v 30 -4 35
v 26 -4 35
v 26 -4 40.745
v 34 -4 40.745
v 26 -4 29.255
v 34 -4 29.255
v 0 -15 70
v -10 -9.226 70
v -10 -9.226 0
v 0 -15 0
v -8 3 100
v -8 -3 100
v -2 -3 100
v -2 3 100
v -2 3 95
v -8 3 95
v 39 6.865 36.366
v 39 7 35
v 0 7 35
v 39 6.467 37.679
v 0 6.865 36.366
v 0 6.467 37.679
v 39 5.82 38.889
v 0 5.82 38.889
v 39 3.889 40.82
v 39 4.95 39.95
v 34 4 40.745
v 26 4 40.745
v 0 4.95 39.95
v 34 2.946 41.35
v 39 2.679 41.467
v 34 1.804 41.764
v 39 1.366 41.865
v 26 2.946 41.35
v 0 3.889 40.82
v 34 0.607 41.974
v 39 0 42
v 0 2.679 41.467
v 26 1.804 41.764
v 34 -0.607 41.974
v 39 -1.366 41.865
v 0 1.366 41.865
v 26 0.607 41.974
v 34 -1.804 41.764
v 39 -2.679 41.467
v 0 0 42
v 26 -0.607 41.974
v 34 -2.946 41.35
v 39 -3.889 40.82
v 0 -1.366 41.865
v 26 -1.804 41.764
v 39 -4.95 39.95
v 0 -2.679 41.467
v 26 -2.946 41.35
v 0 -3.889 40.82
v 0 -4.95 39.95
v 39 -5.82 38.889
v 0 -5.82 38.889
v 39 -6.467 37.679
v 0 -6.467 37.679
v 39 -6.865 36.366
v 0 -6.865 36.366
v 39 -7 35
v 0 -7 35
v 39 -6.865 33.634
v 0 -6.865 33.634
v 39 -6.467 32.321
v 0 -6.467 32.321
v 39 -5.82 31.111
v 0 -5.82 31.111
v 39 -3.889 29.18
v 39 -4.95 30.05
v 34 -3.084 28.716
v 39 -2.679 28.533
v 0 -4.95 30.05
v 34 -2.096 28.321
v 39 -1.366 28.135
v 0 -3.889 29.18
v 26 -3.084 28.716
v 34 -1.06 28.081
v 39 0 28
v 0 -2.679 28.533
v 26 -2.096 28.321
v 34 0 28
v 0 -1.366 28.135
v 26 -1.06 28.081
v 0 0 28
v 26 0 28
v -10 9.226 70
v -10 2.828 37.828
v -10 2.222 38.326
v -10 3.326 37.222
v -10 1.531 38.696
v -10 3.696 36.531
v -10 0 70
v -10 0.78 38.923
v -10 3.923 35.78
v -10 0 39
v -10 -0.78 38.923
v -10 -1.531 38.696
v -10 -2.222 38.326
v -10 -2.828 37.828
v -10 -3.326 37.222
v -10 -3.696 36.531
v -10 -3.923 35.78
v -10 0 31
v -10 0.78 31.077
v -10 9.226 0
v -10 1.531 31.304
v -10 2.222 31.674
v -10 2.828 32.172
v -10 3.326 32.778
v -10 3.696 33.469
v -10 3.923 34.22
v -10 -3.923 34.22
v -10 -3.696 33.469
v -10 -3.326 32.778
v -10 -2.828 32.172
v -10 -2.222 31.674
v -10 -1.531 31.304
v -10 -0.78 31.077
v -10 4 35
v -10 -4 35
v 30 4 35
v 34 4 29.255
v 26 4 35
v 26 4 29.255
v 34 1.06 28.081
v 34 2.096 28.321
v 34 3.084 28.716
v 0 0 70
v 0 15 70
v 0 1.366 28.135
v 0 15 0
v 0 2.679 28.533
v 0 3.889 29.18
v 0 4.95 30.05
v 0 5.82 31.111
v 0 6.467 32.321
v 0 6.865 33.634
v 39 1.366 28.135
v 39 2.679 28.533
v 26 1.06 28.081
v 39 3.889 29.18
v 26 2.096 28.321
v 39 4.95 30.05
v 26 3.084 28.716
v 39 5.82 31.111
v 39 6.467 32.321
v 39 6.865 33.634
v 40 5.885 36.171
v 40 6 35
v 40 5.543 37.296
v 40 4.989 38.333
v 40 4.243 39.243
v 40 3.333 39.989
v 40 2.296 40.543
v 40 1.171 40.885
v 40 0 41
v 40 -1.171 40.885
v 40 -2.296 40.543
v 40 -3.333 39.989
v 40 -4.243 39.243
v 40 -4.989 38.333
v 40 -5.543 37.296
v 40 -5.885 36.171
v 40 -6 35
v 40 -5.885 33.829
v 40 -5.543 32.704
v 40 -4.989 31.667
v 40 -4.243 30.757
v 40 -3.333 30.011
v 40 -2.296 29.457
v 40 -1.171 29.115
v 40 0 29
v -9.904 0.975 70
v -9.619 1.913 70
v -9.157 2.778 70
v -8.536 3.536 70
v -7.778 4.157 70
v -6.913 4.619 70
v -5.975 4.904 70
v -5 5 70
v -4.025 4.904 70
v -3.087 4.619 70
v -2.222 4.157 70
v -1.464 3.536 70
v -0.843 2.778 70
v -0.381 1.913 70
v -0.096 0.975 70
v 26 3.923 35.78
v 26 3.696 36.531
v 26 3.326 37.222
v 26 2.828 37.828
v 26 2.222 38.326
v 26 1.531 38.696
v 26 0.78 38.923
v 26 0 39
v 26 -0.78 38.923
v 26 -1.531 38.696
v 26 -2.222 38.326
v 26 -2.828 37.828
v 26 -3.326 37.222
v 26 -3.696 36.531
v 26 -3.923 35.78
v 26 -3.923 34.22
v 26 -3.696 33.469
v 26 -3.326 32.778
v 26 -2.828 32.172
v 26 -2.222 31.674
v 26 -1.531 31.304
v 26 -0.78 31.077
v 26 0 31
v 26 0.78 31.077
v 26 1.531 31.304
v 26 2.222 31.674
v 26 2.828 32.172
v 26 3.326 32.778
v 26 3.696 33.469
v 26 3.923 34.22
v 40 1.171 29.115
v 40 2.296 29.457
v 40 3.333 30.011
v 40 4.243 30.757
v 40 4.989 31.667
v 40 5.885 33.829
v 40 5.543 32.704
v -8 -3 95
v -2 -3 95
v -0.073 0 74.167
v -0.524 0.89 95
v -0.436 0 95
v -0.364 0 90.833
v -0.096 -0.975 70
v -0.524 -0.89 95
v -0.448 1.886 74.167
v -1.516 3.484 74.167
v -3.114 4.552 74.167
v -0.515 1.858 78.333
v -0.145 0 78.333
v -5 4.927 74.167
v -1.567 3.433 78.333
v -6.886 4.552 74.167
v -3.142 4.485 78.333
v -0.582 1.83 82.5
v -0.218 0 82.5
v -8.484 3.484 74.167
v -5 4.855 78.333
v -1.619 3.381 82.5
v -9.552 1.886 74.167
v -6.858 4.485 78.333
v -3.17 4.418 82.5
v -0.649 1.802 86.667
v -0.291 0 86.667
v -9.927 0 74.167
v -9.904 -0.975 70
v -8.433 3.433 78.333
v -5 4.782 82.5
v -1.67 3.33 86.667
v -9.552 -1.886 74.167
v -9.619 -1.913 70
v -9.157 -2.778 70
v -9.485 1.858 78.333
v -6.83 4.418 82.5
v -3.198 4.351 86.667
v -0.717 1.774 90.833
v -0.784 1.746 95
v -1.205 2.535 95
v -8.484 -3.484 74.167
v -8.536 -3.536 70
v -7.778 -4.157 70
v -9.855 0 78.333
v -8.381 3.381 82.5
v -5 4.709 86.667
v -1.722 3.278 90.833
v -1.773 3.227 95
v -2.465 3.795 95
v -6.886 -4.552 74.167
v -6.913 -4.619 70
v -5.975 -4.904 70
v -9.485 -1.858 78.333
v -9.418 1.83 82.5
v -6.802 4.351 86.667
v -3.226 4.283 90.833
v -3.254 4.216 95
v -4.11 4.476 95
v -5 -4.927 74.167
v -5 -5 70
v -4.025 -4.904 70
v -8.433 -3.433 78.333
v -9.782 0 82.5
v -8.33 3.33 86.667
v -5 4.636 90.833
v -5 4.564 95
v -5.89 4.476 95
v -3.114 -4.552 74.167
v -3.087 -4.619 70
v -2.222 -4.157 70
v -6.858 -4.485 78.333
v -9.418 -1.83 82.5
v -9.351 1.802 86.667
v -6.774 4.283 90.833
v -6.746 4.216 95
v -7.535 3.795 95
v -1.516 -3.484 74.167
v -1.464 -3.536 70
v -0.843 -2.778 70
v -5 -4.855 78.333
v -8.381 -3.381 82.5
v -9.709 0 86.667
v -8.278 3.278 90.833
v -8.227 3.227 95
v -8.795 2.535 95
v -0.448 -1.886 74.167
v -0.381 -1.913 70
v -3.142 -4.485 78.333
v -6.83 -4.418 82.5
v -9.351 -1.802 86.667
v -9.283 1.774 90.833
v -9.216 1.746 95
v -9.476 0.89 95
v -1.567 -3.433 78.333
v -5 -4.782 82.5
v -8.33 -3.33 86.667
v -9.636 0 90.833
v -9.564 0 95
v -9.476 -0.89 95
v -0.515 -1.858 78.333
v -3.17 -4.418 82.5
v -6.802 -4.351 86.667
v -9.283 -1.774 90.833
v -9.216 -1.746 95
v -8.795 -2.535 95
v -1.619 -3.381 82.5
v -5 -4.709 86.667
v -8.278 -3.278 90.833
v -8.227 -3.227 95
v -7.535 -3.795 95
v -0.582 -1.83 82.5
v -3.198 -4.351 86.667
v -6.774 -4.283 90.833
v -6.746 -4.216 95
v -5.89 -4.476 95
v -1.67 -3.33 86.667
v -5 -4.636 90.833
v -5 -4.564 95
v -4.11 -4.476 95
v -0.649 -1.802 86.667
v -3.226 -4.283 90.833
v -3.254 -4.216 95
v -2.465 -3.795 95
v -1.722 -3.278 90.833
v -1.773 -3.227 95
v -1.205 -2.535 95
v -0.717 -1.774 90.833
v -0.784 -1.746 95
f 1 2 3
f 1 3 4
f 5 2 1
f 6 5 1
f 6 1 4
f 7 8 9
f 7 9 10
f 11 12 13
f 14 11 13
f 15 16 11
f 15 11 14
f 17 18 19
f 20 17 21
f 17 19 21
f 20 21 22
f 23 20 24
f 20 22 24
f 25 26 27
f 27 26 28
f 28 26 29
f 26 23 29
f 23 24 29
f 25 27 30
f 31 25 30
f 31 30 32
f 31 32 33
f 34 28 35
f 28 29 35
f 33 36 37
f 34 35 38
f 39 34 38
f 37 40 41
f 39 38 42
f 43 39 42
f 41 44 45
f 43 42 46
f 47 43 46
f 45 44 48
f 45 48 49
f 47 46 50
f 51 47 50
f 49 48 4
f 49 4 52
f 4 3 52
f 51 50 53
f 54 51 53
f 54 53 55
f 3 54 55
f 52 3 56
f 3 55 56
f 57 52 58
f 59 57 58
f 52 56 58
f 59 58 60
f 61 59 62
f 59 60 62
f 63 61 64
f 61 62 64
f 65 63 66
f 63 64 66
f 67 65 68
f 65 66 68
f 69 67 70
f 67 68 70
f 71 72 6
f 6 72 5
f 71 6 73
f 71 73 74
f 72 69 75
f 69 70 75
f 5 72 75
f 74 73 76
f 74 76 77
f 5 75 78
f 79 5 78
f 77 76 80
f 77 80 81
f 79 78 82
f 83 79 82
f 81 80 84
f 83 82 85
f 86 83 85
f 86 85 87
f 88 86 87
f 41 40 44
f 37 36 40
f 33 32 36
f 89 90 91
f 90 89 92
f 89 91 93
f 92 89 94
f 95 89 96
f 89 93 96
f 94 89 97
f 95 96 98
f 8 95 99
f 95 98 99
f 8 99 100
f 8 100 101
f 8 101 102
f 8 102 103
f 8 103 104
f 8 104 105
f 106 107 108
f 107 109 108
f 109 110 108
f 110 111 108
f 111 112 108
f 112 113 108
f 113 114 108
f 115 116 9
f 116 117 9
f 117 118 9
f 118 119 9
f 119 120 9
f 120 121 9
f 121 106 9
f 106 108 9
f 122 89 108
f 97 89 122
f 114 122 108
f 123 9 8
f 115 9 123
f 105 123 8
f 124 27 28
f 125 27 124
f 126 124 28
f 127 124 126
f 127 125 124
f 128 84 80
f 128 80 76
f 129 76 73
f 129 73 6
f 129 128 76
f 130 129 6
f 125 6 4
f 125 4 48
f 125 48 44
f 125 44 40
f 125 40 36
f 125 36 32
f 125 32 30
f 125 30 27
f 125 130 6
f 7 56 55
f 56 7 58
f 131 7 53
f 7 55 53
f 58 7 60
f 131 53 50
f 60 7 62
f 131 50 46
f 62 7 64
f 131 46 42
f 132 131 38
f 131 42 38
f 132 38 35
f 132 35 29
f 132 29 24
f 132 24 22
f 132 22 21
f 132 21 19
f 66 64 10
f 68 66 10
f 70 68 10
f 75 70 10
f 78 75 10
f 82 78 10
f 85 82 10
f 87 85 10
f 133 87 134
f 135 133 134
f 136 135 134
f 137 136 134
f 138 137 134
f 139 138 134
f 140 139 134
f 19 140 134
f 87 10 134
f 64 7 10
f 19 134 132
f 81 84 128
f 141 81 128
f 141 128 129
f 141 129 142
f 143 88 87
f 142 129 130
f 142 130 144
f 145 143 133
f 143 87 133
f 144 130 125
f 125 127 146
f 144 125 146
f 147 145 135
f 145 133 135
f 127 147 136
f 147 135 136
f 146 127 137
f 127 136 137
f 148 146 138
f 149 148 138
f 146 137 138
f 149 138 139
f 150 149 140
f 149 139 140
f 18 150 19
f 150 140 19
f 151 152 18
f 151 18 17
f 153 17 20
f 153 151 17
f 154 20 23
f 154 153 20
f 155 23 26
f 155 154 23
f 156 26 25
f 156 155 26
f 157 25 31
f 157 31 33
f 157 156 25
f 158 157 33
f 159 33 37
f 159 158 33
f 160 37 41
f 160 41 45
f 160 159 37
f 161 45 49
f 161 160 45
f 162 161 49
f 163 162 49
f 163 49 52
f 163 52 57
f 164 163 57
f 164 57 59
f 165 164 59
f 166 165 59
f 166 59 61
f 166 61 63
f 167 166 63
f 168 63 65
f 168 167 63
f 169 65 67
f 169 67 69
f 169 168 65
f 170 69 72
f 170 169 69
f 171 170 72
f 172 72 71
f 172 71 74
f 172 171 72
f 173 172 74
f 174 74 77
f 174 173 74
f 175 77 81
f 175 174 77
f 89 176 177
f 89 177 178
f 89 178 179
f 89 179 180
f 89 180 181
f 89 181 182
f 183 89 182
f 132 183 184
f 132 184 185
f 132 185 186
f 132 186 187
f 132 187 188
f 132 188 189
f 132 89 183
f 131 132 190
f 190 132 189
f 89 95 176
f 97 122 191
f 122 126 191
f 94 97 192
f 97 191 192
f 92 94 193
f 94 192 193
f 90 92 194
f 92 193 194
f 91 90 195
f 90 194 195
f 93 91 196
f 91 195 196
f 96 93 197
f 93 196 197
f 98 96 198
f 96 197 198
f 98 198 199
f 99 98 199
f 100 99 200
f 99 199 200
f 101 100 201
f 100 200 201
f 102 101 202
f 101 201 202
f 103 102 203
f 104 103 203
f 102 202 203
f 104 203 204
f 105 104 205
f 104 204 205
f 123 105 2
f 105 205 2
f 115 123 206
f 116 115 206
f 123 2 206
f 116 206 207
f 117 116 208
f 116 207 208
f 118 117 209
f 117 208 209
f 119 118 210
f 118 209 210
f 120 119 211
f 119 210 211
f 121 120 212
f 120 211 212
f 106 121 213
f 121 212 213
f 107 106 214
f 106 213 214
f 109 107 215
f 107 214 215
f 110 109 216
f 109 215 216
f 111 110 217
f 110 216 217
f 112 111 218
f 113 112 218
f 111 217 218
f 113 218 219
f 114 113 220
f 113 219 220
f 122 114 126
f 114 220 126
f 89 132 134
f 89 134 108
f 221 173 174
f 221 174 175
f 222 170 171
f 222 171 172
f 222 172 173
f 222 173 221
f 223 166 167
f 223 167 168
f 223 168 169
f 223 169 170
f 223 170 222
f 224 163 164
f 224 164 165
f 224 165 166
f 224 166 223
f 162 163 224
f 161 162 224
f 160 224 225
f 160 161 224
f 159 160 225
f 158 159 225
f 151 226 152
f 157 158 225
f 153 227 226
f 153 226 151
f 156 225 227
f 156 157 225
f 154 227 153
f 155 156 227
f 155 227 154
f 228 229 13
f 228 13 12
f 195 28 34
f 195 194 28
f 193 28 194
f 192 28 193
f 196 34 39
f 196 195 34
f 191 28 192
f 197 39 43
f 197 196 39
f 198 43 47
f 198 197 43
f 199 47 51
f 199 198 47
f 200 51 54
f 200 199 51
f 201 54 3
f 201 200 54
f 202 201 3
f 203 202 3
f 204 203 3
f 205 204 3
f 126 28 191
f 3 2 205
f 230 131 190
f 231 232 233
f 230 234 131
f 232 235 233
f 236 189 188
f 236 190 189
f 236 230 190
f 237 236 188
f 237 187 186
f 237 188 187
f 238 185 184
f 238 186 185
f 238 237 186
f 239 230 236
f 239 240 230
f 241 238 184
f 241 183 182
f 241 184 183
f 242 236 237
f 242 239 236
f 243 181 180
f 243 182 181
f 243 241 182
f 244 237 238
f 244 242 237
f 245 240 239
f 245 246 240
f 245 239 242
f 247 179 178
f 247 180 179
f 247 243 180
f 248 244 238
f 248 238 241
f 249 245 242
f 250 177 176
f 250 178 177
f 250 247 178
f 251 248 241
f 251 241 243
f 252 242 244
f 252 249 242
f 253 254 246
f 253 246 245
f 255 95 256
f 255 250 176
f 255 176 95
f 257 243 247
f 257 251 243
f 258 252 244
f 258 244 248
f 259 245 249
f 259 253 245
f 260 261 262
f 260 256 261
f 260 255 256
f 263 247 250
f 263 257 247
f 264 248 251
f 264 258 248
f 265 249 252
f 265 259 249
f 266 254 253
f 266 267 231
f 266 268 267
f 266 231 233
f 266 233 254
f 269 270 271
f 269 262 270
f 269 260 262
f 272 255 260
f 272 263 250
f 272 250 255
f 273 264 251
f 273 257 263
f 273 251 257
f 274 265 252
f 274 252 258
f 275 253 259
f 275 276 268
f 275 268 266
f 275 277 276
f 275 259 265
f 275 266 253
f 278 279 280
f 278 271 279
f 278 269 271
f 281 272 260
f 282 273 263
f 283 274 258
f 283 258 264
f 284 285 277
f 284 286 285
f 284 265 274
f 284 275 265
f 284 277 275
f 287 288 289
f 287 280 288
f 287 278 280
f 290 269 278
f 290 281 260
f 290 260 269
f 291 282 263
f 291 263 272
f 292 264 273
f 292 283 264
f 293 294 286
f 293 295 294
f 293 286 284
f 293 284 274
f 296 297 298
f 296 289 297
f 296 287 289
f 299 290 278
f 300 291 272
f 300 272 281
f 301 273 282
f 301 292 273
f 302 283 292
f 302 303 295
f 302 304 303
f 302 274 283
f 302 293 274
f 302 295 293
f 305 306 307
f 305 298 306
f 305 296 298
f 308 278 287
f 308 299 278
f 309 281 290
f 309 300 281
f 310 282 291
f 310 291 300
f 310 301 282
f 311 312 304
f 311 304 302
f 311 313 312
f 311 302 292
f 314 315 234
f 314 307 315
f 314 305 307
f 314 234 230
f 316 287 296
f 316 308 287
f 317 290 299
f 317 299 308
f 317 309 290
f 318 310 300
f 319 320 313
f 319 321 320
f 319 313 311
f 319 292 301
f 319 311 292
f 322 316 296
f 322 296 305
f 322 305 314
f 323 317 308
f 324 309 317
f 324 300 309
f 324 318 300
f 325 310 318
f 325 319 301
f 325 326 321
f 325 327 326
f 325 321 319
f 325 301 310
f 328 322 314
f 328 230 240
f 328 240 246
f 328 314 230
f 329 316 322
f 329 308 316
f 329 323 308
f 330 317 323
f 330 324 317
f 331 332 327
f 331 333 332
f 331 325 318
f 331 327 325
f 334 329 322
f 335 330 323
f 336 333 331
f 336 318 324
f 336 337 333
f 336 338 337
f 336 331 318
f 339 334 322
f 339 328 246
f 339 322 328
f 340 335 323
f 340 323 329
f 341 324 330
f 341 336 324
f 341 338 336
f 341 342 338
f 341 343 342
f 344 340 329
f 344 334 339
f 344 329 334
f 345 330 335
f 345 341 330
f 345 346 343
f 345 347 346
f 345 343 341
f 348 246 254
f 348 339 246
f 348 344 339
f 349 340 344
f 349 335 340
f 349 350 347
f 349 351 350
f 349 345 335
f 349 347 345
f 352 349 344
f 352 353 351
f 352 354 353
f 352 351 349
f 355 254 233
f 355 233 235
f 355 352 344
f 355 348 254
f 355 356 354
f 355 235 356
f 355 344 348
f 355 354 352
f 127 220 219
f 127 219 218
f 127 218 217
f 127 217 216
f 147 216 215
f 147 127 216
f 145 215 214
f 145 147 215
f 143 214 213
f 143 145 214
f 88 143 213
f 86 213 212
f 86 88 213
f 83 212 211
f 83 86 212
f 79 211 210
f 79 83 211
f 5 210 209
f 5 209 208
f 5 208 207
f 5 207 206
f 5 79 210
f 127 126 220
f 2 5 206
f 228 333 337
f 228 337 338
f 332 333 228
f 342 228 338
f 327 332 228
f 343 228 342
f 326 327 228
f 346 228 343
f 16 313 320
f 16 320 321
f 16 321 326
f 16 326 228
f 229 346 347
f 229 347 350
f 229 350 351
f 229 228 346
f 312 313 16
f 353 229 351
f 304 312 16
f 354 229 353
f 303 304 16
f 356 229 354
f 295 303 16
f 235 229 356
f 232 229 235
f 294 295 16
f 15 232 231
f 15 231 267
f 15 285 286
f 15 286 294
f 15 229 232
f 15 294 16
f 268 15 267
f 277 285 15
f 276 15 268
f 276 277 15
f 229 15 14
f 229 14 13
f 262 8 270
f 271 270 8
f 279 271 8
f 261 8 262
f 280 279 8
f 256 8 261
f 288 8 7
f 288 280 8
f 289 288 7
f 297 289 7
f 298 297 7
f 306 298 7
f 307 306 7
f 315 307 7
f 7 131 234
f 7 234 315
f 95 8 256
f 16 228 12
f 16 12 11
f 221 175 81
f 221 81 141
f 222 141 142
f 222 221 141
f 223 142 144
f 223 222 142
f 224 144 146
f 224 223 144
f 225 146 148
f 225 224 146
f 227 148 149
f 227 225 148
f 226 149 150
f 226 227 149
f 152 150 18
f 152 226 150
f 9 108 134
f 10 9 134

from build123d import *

# Parameters (mm, degrees)
F1_DEPTH      = 70
F3_DEPTH      = 40
F4_SIZE       = 1
F6_DEPTH      = 25
F6_DEPTH_BACK = 100
F7_R          = 4
F8_DEPTH      = 30
F8_DEPTH_BACK = 25
F10_R         = 5
F11_DEPTH     = 30
F11_TAPER     = 1
F13_START     = 25
F12_R         = 21.0146982342
F13_DEPTH     = 15


with BuildPart() as f1:
    # F0 (on Top) → F1 (new body)
    with BuildSketch(Plane.XY):
        Polygon((0, -15), (0, 0), (0, 15), (-10, 9.2264973081), (-10, -9.2264973081), align=None)
    extrude(amount=F1_DEPTH)

    # F2 (on Right) → F3 (join)
    with BuildSketch(Plane.YZ):
        with BuildLine():
            ThreePointArc((7, 35), (-4.9497474683, 39.9497474683), (0, 28))
            ThreePointArc((0, 28), (4.9497474683, 30.0502525317), (7, 35))
        make_face()
        with BuildLine():
            ThreePointArc((4, 35), (2.8284271247, 32.1715728753), (0, 31))
            ThreePointArc((0, 31), (-2.8284271247, 37.8284271247), (4, 35))
        make_face(mode=Mode.SUBTRACT)
        with BuildLine():
            ThreePointArc((4, 35), (-2.8284271247, 37.8284271247), (0, 31))
            ThreePointArc((0, 31), (2.8284271247, 32.1715728753), (4, 35))
        make_face()
    extrude(amount=F3_DEPTH)

    # F4
    f4_edges = [f1.edges().sort_by_distance(p)[0] for p in [
        (40, -7, 35),
    ]]
    chamfer(f4_edges, length=F4_SIZE)

    # F5 (on Top) → F6 (cut, two sides)
    with BuildSketch(Plane.XY) as f6_sk:
        Polygon((26, -4), (34, -4), (34, 4), (26, 4), (26, 0), align=None)
    extrude(amount=-F6_DEPTH, mode=Mode.SUBTRACT)
    extrude(f6_sk.sketch, amount=F6_DEPTH_BACK, mode=Mode.SUBTRACT)

    # F7 (on Right) → F8 (cut, two sides)
    with BuildSketch(Plane.YZ) as f8_sk:
        with Locations((0, 35)):
            Circle(F7_R)
    extrude(amount=F8_DEPTH, mode=Mode.SUBTRACT)
    extrude(f8_sk.sketch, amount=-F8_DEPTH_BACK, mode=Mode.SUBTRACT)

    # F10 (on offset) → F11 (join)
    with BuildSketch(Plane.XY.offset(70)):
        with Locations((-5, 0)):
            Circle(F10_R)
    extrude(amount=F11_DEPTH, taper=F11_TAPER)

    # F12 (on offset) → F13 (cut)
    with BuildSketch(Plane.XY.offset(70).offset(F13_START)):
        with Locations((-5, 0)):
            Circle(F12_R)
        Polygon((-2, -3), (-8, -3), (-8, 3), (-2, 3), (-2, 0), align=None, mode=Mode.SUBTRACT)
    extrude(amount=F13_DEPTH, mode=Mode.SUBTRACT)


solid = f1.part
